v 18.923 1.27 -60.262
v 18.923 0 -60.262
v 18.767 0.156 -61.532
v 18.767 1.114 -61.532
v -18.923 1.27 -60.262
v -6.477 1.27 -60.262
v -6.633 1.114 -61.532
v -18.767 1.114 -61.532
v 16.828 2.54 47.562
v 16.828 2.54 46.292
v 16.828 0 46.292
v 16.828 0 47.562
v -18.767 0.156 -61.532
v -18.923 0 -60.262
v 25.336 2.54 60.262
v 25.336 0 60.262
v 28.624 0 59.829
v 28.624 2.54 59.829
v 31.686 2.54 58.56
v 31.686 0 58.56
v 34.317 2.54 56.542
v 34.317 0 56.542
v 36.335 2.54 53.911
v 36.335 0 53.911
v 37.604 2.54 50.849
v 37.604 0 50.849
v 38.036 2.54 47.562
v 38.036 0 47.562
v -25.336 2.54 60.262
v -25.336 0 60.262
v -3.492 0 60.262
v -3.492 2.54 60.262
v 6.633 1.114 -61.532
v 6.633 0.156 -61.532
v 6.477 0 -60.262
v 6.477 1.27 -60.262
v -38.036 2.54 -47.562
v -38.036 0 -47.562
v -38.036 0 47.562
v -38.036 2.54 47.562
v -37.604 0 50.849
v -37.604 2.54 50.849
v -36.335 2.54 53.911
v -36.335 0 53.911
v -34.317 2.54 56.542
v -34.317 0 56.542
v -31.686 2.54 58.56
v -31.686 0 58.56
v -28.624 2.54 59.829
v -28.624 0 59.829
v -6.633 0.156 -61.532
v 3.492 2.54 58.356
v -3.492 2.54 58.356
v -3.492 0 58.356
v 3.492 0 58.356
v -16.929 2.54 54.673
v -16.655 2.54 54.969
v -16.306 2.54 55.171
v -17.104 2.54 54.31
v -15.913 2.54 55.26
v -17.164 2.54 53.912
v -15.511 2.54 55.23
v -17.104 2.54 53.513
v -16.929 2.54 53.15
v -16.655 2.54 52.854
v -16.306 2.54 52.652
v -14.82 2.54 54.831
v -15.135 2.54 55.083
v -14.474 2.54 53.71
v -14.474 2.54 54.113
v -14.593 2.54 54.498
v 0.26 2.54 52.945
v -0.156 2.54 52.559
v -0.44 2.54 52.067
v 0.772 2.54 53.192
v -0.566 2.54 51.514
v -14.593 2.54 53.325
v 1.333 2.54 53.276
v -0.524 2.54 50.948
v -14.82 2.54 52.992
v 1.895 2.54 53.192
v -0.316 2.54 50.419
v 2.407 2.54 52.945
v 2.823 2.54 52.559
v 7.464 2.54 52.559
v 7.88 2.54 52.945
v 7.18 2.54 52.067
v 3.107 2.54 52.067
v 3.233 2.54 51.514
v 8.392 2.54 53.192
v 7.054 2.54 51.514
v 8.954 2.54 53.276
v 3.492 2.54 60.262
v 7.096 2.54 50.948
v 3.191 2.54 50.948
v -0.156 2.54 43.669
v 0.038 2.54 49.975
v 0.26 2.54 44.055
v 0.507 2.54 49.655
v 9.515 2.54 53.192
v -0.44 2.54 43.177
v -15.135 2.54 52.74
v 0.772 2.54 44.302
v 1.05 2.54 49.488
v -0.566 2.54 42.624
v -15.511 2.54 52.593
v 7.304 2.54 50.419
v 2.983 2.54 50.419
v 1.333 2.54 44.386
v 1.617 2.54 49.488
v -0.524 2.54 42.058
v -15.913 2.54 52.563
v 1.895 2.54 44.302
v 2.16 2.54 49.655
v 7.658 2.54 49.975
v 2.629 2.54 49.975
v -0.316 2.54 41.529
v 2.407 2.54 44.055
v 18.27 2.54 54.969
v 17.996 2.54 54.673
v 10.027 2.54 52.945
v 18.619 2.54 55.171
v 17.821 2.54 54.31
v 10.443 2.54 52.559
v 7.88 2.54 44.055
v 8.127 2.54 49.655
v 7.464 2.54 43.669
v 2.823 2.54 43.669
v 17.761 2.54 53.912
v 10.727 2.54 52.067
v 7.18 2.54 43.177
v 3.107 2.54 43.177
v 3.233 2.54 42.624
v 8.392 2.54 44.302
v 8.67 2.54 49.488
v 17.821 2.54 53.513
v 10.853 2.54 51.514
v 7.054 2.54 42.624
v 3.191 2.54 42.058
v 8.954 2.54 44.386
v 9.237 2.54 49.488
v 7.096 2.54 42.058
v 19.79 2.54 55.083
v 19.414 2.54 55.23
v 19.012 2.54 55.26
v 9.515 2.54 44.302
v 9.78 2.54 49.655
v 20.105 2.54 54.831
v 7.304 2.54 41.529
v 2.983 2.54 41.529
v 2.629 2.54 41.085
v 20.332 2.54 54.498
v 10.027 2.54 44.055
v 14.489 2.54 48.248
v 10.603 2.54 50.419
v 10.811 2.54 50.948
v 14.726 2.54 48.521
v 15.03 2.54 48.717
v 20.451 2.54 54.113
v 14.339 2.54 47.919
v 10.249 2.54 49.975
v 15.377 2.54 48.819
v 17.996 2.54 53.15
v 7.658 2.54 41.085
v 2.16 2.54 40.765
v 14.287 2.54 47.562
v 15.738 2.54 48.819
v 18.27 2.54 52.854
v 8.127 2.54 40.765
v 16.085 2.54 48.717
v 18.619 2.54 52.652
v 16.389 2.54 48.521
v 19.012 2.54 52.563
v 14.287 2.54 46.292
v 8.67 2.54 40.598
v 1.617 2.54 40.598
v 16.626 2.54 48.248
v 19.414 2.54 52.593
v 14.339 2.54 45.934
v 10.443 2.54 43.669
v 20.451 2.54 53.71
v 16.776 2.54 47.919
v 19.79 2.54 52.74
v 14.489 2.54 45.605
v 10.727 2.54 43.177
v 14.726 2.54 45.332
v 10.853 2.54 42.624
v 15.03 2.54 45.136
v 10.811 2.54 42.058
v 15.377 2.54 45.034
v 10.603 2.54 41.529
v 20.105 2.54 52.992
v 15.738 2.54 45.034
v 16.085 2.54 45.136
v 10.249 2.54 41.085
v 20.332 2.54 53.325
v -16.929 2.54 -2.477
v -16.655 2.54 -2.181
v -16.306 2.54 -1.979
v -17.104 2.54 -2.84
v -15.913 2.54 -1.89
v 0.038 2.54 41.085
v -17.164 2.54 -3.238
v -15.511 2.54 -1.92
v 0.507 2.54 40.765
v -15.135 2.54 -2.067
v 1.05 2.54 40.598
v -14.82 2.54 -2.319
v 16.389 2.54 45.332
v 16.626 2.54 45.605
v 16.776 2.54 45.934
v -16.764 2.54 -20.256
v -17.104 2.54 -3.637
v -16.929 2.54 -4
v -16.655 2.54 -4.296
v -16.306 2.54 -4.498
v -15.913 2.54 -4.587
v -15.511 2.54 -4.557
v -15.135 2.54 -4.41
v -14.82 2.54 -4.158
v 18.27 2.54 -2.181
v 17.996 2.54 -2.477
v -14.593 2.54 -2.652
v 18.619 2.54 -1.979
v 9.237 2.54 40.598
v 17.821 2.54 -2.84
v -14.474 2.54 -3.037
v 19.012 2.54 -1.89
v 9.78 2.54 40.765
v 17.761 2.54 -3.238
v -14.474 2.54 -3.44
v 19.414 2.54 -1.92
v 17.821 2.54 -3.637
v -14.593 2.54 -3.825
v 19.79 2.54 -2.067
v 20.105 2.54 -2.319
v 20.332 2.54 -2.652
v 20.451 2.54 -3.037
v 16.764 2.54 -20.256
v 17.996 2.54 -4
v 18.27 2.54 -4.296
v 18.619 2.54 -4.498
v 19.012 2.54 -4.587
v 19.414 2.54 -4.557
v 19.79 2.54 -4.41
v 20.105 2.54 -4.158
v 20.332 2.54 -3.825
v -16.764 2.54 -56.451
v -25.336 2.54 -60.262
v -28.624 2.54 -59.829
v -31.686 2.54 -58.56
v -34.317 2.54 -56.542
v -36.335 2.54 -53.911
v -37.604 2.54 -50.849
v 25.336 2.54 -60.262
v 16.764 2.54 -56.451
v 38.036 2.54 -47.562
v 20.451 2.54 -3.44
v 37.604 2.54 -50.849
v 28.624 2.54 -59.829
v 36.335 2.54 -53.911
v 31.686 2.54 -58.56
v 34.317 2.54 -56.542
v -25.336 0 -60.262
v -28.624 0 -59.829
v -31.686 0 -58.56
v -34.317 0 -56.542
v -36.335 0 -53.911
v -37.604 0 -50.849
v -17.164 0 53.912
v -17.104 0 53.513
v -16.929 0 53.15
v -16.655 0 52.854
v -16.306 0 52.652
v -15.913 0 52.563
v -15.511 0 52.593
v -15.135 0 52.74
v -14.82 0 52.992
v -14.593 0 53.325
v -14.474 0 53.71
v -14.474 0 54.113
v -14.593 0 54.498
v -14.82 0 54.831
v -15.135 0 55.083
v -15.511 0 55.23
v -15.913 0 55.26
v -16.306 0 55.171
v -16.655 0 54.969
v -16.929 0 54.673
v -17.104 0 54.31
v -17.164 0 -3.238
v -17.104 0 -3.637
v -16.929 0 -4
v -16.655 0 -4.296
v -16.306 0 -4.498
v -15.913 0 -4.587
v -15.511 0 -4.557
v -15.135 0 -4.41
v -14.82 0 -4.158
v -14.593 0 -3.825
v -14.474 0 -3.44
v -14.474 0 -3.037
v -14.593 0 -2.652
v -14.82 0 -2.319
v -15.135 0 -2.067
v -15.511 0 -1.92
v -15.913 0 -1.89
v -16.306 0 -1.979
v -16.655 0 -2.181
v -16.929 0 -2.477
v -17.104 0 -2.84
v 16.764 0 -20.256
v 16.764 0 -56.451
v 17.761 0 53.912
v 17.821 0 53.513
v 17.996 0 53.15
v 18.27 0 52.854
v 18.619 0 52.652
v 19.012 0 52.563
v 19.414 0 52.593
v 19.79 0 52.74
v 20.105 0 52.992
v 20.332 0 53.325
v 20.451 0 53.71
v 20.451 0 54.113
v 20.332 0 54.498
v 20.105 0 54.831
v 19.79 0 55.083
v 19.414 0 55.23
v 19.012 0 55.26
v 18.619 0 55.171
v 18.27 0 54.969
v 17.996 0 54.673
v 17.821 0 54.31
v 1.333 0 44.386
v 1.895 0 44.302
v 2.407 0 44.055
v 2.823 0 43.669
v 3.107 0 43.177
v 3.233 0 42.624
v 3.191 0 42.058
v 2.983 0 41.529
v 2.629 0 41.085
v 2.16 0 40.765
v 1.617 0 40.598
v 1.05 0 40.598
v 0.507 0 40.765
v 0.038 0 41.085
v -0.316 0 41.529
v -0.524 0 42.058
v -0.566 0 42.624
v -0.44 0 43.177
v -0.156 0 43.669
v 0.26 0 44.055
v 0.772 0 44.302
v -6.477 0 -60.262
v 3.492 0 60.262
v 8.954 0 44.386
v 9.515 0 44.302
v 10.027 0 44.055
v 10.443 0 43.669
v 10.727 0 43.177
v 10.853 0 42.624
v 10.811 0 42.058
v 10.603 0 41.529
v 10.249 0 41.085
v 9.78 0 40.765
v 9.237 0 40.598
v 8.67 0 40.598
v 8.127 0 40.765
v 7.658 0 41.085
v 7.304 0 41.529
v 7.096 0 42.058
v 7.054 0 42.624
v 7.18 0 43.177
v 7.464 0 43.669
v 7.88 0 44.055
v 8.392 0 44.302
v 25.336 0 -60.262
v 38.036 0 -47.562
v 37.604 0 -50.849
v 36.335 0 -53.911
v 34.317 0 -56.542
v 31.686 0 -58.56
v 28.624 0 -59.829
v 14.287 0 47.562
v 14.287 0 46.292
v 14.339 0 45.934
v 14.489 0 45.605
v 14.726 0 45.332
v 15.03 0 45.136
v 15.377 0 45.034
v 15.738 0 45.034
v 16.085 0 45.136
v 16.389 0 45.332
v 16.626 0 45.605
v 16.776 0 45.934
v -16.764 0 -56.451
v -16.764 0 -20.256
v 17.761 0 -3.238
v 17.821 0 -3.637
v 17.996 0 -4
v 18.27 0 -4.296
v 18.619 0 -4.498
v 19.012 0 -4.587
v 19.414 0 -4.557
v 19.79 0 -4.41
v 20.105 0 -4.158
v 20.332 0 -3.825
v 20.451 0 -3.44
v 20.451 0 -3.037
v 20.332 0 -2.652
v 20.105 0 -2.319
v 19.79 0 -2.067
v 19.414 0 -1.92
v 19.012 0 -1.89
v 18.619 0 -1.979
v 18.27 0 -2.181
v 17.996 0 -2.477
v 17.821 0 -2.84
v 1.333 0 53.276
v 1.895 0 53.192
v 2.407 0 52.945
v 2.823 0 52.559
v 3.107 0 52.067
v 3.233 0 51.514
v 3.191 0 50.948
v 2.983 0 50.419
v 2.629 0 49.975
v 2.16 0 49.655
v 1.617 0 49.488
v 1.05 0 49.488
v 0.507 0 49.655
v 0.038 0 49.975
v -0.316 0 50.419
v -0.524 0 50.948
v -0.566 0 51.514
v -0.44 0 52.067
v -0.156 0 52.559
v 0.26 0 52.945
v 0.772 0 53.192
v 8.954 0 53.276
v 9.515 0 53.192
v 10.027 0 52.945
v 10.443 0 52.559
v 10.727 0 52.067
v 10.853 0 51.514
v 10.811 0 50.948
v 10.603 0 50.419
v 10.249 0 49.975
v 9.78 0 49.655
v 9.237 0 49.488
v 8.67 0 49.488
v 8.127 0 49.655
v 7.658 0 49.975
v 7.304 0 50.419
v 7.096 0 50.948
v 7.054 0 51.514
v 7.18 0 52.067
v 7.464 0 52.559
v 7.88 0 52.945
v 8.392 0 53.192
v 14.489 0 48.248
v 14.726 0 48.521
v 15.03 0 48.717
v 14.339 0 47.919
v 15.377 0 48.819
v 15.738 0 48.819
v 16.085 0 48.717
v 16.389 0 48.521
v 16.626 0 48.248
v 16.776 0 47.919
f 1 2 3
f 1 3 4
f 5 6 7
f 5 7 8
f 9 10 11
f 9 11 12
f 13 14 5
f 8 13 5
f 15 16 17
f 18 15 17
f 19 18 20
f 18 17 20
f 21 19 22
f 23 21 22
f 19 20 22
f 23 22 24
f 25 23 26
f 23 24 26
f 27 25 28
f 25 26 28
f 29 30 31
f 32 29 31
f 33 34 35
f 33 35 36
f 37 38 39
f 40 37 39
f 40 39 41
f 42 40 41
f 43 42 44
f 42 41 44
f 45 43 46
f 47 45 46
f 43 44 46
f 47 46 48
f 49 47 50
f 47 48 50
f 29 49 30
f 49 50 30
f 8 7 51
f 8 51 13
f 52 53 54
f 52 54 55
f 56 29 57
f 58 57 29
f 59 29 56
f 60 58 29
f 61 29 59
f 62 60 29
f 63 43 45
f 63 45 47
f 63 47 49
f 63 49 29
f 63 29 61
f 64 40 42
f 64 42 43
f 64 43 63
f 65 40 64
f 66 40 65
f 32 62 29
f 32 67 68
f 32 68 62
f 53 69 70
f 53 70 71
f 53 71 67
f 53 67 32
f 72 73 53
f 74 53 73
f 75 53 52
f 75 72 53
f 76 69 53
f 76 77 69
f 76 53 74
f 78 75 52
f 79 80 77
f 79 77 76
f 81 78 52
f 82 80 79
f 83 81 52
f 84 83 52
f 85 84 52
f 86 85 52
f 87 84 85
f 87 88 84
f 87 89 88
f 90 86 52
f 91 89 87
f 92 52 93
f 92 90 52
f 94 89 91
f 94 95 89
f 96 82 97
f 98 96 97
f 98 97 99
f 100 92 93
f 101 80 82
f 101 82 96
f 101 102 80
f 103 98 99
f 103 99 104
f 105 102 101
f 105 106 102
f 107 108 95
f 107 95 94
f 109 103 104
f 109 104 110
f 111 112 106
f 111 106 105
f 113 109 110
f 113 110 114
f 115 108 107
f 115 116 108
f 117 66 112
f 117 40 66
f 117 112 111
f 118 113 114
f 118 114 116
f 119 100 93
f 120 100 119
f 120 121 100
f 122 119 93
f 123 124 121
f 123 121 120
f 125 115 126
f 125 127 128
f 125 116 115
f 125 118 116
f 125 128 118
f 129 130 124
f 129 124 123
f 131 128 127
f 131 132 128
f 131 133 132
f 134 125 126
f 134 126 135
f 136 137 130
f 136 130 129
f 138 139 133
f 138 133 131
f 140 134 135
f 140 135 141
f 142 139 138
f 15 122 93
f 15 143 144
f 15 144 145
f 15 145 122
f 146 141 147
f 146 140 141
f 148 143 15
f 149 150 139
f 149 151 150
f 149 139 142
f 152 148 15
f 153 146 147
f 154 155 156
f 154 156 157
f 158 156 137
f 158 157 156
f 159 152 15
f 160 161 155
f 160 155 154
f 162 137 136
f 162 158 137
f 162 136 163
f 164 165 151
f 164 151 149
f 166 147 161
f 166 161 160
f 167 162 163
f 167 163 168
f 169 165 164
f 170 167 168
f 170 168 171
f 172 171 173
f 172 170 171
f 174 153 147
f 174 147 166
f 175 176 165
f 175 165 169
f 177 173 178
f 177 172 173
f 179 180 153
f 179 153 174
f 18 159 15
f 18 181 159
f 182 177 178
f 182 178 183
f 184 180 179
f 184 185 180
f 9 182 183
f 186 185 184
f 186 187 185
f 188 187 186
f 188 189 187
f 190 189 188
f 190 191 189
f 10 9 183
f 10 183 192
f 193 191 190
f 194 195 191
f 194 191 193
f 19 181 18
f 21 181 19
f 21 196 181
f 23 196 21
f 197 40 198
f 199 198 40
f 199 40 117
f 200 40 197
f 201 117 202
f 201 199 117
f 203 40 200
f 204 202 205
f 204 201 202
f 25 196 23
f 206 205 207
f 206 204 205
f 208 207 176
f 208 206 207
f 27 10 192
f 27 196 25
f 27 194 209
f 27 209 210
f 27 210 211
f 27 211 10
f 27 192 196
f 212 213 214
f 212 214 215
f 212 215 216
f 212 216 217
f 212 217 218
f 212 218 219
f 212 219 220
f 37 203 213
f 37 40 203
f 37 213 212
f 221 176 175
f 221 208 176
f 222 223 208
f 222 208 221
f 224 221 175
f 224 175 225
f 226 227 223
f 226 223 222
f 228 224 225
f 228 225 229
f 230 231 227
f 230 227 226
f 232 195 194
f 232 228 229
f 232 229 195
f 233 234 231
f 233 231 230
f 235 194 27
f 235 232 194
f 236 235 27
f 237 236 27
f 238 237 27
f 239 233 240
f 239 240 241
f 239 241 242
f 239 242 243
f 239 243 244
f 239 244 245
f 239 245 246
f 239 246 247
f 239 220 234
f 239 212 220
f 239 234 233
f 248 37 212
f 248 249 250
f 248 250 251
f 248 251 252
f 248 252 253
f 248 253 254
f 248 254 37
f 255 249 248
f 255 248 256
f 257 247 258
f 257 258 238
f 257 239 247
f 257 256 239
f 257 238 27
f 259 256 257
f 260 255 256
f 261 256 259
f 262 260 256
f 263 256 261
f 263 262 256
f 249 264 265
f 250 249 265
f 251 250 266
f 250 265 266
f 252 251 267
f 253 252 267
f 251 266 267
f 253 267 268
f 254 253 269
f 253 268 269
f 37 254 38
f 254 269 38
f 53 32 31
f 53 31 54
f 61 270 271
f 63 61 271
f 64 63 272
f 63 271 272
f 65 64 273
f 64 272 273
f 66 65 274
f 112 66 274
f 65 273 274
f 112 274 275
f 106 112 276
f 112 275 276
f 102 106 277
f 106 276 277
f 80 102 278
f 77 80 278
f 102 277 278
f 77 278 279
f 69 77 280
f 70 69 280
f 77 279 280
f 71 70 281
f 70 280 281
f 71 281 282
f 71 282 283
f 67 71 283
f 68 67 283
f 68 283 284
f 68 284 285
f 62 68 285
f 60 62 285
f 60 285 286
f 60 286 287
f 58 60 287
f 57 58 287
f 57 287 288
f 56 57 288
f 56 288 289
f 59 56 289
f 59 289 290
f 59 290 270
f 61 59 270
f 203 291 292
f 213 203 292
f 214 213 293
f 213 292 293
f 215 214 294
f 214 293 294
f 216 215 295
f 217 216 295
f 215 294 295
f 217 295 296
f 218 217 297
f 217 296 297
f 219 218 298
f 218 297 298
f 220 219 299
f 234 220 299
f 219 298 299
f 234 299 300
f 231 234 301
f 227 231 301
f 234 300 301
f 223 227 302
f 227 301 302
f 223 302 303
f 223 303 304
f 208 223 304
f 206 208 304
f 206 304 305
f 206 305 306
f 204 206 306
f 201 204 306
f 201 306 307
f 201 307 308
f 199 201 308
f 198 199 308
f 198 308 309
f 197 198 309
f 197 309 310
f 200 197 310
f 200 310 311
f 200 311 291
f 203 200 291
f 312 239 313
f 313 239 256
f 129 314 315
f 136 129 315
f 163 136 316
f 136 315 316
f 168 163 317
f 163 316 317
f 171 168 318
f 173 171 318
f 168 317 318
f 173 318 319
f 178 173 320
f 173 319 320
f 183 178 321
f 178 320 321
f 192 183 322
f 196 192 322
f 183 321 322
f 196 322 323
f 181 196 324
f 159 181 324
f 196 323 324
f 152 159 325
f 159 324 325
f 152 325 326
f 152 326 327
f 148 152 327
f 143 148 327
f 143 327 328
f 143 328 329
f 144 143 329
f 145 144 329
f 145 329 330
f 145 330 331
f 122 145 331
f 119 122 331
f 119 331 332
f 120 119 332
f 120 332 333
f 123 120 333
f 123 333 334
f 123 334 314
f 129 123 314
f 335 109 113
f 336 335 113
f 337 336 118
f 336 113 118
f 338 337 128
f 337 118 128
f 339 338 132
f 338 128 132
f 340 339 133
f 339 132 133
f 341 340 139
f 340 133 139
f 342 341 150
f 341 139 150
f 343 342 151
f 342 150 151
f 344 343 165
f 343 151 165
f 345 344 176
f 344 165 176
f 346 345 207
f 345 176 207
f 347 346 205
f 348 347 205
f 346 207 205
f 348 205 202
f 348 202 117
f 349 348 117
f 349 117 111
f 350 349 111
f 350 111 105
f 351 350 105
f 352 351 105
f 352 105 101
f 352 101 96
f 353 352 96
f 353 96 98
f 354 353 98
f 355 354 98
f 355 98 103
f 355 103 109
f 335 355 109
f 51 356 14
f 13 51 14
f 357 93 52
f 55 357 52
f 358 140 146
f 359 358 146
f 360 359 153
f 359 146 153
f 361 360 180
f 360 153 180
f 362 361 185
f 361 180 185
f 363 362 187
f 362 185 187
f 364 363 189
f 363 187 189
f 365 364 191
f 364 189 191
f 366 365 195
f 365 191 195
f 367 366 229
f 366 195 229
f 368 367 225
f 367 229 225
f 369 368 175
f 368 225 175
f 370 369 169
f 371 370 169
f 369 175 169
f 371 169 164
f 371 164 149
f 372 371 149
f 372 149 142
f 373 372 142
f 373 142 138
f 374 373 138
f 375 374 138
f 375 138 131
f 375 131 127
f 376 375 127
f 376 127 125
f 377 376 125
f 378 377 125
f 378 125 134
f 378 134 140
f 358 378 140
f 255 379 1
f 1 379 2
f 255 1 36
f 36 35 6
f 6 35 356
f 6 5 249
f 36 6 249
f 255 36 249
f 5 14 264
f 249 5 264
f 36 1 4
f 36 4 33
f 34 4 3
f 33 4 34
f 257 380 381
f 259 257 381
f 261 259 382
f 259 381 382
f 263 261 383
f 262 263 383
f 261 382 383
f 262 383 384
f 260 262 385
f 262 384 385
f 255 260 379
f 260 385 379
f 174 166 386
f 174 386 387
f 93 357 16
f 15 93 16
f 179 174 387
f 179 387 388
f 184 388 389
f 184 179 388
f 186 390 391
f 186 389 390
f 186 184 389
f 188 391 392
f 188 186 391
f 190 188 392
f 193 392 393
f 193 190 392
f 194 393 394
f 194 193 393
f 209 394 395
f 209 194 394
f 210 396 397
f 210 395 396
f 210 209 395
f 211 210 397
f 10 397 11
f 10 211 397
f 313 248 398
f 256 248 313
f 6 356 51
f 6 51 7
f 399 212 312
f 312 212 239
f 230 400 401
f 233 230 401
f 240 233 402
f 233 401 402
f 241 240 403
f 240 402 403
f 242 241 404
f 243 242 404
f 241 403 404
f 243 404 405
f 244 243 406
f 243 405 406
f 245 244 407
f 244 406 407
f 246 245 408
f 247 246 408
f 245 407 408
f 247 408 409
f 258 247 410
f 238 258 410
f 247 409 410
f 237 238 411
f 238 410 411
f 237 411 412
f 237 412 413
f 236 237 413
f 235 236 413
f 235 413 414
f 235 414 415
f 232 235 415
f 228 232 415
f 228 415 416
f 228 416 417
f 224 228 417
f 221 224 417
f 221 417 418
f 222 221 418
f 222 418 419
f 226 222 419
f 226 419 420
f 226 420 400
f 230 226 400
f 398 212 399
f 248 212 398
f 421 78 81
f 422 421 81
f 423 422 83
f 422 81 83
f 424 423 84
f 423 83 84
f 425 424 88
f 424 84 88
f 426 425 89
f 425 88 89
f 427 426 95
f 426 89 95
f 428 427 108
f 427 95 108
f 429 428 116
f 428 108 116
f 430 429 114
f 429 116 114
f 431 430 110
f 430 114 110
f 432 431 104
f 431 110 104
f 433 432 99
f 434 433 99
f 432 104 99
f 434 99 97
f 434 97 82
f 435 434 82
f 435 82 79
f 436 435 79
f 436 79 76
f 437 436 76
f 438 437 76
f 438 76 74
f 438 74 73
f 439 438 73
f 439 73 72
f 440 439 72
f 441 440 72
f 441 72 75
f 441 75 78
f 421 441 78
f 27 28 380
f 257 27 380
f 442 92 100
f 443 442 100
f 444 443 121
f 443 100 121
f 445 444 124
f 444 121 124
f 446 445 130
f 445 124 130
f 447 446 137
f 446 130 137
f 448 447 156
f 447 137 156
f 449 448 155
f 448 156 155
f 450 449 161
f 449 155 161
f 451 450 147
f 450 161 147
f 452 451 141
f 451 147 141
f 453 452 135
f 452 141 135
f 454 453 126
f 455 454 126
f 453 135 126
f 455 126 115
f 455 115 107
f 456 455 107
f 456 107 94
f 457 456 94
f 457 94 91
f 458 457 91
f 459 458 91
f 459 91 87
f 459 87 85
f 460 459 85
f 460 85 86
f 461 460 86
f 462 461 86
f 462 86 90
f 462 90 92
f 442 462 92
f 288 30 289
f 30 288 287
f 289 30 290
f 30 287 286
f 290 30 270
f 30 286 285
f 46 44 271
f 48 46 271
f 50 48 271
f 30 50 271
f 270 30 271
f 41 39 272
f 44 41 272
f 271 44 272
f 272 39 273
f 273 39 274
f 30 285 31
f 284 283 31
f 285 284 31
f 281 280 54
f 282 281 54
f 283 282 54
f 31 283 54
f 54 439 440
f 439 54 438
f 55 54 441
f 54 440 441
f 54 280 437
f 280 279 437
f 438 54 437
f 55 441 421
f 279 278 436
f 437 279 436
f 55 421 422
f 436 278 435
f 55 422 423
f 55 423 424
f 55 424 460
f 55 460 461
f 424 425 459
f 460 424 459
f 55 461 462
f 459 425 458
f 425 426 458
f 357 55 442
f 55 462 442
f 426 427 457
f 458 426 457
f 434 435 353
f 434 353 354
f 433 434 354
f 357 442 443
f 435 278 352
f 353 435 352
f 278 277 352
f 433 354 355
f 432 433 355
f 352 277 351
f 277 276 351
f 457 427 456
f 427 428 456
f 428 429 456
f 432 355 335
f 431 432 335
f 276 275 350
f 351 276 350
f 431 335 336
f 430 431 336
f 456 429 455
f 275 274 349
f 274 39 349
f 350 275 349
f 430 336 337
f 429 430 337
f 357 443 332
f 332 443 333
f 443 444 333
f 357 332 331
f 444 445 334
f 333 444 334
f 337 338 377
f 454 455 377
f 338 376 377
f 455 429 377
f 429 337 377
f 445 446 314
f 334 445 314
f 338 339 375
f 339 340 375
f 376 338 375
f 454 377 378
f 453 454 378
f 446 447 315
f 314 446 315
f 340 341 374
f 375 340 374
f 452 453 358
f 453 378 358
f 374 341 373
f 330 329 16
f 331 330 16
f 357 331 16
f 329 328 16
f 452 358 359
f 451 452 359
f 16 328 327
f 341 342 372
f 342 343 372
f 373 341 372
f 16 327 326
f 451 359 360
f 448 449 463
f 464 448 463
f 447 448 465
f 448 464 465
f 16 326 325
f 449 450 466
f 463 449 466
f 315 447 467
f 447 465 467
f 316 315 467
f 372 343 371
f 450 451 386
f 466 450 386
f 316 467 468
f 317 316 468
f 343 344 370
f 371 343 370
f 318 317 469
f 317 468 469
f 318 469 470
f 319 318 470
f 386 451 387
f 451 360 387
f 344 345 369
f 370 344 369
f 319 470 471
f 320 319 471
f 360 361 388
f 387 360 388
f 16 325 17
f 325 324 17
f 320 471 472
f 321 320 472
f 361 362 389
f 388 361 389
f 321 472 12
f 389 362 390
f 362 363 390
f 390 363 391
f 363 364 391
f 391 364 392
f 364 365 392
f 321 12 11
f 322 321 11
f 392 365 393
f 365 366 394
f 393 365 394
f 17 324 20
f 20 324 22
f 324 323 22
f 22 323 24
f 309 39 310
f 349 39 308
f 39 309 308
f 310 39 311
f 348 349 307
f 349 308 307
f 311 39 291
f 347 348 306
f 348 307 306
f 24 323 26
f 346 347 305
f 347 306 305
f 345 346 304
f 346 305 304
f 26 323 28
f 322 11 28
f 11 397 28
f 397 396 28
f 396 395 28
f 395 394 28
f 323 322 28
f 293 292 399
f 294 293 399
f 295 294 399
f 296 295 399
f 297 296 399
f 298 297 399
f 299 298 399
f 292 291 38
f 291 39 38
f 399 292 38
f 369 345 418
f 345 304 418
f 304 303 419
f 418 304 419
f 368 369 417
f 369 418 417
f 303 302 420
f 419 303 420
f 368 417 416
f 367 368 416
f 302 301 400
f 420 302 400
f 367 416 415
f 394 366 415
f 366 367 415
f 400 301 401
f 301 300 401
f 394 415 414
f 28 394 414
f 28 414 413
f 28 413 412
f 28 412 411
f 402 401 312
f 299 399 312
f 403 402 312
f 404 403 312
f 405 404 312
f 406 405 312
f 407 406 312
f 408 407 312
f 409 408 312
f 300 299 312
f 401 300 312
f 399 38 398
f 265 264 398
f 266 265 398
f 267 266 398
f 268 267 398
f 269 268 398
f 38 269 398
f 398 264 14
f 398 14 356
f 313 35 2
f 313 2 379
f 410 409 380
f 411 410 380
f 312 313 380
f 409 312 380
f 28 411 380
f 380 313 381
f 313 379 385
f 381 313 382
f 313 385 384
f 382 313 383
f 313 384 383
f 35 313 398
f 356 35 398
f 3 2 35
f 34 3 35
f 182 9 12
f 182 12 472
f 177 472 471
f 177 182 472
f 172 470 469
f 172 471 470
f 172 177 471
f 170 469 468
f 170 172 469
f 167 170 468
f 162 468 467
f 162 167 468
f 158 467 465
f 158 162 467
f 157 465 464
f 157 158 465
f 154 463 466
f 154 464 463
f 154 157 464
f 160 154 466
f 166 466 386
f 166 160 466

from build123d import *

# Parameters (mm, degrees)
TOP_DEPTH                 = 2.54
SKETCH7_R                 = 1.905
BUTTONLEDCUT_DEPTH        = 72.306909304
SKETCH8_W                 = 33.528
SKETCH8_H                 = 36.195
SOLARCUT_DEPTH            = 72.306909304
F_6_32_TAPPED_HOLE1_D     = 2.7051
F_6_32_TAPPED_HOLE1_DEPTH = 11.176
F_6_32_TAPPED_HOLE1_TIP   = 0.81269403
SKETCH13_W                = 12.446
SKETCH13_H                = 1.27
BODY_TABS_DEPTH           = 1.27
BODY_TABS_DRAFT           = 7
BODY_TABS_PROFILE_2_DEPTH = 1.27
BODY_TABS_PROFILE_2_DRAFT = 7
SKETCH14_W                = 6.985
SKETCH14_H                = 1.905
FLAT_HEAD_HOLE_DEPTH      = 73.383371188


with BuildPart() as part:
    # Sketch2 → top (new body)
    with BuildSketch(Plane(origin=(0, 0, 0), x_dir=(1, 0, 0), z_dir=(0, 1, 0))):
        with BuildLine():
            Line((-25.3365, -60.2615), (25.3365, -60.2615))
            ThreePointArc((25.3365, -60.2615), (34.316756121, -56.541756121), (38.0365, -47.5615))
            Line((38.0365, -47.5615), (38.0365, 47.5615))
            ThreePointArc((38.0365, 47.5615), (34.316756121, 56.541756121), (25.3365, 60.2615))
            Line((25.3365, 60.2615), (-25.3365, 60.2615))
            ThreePointArc((-25.3365, 60.2615), (-34.316756121, 56.541756121), (-38.0365, 47.5615))
            Line((-38.0365, 47.5615), (-38.0365, -47.5615))
            ThreePointArc((-38.0365, -47.5615), (-34.316756121, -56.541756121), (-25.3365, -60.2615))
        make_face()
    extrude(amount=TOP_DEPTH)

    # Sketch7 → ButtonLEDCut (cut, through all)
    with BuildSketch(Plane(origin=(0, 2.54, 0), x_dir=(1, 0, 0), z_dir=(0, 1, 0))):
        with Locations(Location((1.3335, -51.3715, 0), (0, 0, 270))):
            Circle(SKETCH7_R)
        with Locations(Location((8.9535, -51.3715, 0), (0, 0, 270))):
            Circle(SKETCH7_R)
        with Locations(Location((8.9535, -42.4815, 0), (0, 0, 270))):
            Circle(SKETCH7_R)
        with Locations(Location((1.3335, -42.4815, 0), (0, 0, 270))):
            Circle(SKETCH7_R)
        with BuildLine():
            Line((16.8275, -46.2915), (16.8275, -47.5615))
            ThreePointArc((16.8275, -47.5615), (15.5575, -48.8315), (14.2875, -47.5615))
            Line((14.2875, -47.5615), (14.2875, -46.2915))
            ThreePointArc((14.2875, -46.2915), (15.5575, -45.0215), (16.8275, -46.2915))
        make_face()
    extrude(amount=-BUTTONLEDCUT_DEPTH, mode=Mode.SUBTRACT)

    # Sketch8 → SolarCut (cut, through all)
    with BuildSketch(Plane(origin=(0, 2.54, 0), x_dir=(1, 0, 0), z_dir=(0, 1, 0))):
        with Locations((0, 38.354)):
            Rectangle(SKETCH8_W, SKETCH8_H)
    extrude(amount=-SOLARCUT_DEPTH, mode=Mode.SUBTRACT)

    # #6-32 Tapped Hole1
    with Locations(Plane(origin=(0, 2.54, 0), x_dir=(1, 0, 0), z_dir=(0, 1, 0))):
        with Locations((-15.8115, 3.2385), (19.1135, 3.2385), (19.1135, -53.9115), (-15.8115, -53.9115)):
            Hole(F_6_32_TAPPED_HOLE1_D / 2, depth=F_6_32_TAPPED_HOLE1_DEPTH)
            with Locations((0, 0, -(F_6_32_TAPPED_HOLE1_DEPTH + F_6_32_TAPPED_HOLE1_TIP / 2))):  # 118° drill point
                Cone(0, F_6_32_TAPPED_HOLE1_D / 2, F_6_32_TAPPED_HOLE1_TIP, mode=Mode.SUBTRACT)


with BuildPart() as body_tabs_tool:
    # Sketch13 → Body Tabs (with draft: the straight prism first)
    with BuildSketch(Plane(origin=(0, 0, -60.2615), x_dir=(-1, 0, 0), z_dir=(0, 0, -1))):
        with Locations((-12.7, 0.635)):
            Rectangle(SKETCH13_W, SKETCH13_H)
    extrude(amount=BODY_TABS_DEPTH)
    # Body Tabs: the draft: its side faces are tilted about the plane it starts from
    body_tabs_sides = [body_tabs_tool.faces().sort_by_distance(p)[0] for p in [
        (12.7, 0, -60.8965),
        (6.477, 0.635, -60.8965),
        (12.7, 1.27, -60.8965),
        (18.923, 0.635, -60.8965),
    ]]
    draft(body_tabs_sides, Plane(origin=(0, 0, -60.2615), x_dir=(-1, 0, 0), z_dir=(0, 0, -1)), BODY_TABS_DRAFT)


with BuildPart() as part_1:
    add(part.part)

    # Body Tabs: add body_tabs_tool
    add(body_tabs_tool.part)


with BuildPart() as body_tabs_profile_2_tool:
    # Sketch13 → Body Tabs profile 2 (with draft: the straight prism first)
    with BuildSketch(Plane(origin=(0, 0, -60.2615), x_dir=(-1, 0, 0), z_dir=(0, 0, -1))):
        with Locations((12.7, 0.635)):
            Rectangle(SKETCH13_W, SKETCH13_H)
    extrude(amount=BODY_TABS_PROFILE_2_DEPTH)
    # Body Tabs profile 2: the draft: its side faces are tilted about the plane it starts from
    body_tabs_profile_2_sides = [body_tabs_profile_2_tool.faces().sort_by_distance(p)[0] for p in [
        (-18.923, 0.635, -60.8965),
        (-12.7, 1.27, -60.8965),
        (-6.477, 0.635, -60.8965),
        (-12.7, 0, -60.8965),
    ]]
    draft(body_tabs_profile_2_sides, Plane(origin=(0, 0, -60.2615), x_dir=(-1, 0, 0), z_dir=(0, 0, -1)), BODY_TABS_PROFILE_2_DRAFT)


with BuildPart() as part_2:
    add(part_1.part)

    # Body Tabs profile 2: add body_tabs_profile_2_tool
    add(body_tabs_profile_2_tool.part)

    # Sketch14 → Flat Head Hole (cut, through all)
    with BuildSketch(Plane(origin=(0, 2.54, 0), x_dir=(1, 0, 0), z_dir=(0, 1, 0))):
        with Locations((0, -59.309)):
            Rectangle(SKETCH14_W, SKETCH14_H)
    extrude(amount=-FLAT_HEAD_HOLE_DEPTH, mode=Mode.SUBTRACT)


solid = part_2.part
